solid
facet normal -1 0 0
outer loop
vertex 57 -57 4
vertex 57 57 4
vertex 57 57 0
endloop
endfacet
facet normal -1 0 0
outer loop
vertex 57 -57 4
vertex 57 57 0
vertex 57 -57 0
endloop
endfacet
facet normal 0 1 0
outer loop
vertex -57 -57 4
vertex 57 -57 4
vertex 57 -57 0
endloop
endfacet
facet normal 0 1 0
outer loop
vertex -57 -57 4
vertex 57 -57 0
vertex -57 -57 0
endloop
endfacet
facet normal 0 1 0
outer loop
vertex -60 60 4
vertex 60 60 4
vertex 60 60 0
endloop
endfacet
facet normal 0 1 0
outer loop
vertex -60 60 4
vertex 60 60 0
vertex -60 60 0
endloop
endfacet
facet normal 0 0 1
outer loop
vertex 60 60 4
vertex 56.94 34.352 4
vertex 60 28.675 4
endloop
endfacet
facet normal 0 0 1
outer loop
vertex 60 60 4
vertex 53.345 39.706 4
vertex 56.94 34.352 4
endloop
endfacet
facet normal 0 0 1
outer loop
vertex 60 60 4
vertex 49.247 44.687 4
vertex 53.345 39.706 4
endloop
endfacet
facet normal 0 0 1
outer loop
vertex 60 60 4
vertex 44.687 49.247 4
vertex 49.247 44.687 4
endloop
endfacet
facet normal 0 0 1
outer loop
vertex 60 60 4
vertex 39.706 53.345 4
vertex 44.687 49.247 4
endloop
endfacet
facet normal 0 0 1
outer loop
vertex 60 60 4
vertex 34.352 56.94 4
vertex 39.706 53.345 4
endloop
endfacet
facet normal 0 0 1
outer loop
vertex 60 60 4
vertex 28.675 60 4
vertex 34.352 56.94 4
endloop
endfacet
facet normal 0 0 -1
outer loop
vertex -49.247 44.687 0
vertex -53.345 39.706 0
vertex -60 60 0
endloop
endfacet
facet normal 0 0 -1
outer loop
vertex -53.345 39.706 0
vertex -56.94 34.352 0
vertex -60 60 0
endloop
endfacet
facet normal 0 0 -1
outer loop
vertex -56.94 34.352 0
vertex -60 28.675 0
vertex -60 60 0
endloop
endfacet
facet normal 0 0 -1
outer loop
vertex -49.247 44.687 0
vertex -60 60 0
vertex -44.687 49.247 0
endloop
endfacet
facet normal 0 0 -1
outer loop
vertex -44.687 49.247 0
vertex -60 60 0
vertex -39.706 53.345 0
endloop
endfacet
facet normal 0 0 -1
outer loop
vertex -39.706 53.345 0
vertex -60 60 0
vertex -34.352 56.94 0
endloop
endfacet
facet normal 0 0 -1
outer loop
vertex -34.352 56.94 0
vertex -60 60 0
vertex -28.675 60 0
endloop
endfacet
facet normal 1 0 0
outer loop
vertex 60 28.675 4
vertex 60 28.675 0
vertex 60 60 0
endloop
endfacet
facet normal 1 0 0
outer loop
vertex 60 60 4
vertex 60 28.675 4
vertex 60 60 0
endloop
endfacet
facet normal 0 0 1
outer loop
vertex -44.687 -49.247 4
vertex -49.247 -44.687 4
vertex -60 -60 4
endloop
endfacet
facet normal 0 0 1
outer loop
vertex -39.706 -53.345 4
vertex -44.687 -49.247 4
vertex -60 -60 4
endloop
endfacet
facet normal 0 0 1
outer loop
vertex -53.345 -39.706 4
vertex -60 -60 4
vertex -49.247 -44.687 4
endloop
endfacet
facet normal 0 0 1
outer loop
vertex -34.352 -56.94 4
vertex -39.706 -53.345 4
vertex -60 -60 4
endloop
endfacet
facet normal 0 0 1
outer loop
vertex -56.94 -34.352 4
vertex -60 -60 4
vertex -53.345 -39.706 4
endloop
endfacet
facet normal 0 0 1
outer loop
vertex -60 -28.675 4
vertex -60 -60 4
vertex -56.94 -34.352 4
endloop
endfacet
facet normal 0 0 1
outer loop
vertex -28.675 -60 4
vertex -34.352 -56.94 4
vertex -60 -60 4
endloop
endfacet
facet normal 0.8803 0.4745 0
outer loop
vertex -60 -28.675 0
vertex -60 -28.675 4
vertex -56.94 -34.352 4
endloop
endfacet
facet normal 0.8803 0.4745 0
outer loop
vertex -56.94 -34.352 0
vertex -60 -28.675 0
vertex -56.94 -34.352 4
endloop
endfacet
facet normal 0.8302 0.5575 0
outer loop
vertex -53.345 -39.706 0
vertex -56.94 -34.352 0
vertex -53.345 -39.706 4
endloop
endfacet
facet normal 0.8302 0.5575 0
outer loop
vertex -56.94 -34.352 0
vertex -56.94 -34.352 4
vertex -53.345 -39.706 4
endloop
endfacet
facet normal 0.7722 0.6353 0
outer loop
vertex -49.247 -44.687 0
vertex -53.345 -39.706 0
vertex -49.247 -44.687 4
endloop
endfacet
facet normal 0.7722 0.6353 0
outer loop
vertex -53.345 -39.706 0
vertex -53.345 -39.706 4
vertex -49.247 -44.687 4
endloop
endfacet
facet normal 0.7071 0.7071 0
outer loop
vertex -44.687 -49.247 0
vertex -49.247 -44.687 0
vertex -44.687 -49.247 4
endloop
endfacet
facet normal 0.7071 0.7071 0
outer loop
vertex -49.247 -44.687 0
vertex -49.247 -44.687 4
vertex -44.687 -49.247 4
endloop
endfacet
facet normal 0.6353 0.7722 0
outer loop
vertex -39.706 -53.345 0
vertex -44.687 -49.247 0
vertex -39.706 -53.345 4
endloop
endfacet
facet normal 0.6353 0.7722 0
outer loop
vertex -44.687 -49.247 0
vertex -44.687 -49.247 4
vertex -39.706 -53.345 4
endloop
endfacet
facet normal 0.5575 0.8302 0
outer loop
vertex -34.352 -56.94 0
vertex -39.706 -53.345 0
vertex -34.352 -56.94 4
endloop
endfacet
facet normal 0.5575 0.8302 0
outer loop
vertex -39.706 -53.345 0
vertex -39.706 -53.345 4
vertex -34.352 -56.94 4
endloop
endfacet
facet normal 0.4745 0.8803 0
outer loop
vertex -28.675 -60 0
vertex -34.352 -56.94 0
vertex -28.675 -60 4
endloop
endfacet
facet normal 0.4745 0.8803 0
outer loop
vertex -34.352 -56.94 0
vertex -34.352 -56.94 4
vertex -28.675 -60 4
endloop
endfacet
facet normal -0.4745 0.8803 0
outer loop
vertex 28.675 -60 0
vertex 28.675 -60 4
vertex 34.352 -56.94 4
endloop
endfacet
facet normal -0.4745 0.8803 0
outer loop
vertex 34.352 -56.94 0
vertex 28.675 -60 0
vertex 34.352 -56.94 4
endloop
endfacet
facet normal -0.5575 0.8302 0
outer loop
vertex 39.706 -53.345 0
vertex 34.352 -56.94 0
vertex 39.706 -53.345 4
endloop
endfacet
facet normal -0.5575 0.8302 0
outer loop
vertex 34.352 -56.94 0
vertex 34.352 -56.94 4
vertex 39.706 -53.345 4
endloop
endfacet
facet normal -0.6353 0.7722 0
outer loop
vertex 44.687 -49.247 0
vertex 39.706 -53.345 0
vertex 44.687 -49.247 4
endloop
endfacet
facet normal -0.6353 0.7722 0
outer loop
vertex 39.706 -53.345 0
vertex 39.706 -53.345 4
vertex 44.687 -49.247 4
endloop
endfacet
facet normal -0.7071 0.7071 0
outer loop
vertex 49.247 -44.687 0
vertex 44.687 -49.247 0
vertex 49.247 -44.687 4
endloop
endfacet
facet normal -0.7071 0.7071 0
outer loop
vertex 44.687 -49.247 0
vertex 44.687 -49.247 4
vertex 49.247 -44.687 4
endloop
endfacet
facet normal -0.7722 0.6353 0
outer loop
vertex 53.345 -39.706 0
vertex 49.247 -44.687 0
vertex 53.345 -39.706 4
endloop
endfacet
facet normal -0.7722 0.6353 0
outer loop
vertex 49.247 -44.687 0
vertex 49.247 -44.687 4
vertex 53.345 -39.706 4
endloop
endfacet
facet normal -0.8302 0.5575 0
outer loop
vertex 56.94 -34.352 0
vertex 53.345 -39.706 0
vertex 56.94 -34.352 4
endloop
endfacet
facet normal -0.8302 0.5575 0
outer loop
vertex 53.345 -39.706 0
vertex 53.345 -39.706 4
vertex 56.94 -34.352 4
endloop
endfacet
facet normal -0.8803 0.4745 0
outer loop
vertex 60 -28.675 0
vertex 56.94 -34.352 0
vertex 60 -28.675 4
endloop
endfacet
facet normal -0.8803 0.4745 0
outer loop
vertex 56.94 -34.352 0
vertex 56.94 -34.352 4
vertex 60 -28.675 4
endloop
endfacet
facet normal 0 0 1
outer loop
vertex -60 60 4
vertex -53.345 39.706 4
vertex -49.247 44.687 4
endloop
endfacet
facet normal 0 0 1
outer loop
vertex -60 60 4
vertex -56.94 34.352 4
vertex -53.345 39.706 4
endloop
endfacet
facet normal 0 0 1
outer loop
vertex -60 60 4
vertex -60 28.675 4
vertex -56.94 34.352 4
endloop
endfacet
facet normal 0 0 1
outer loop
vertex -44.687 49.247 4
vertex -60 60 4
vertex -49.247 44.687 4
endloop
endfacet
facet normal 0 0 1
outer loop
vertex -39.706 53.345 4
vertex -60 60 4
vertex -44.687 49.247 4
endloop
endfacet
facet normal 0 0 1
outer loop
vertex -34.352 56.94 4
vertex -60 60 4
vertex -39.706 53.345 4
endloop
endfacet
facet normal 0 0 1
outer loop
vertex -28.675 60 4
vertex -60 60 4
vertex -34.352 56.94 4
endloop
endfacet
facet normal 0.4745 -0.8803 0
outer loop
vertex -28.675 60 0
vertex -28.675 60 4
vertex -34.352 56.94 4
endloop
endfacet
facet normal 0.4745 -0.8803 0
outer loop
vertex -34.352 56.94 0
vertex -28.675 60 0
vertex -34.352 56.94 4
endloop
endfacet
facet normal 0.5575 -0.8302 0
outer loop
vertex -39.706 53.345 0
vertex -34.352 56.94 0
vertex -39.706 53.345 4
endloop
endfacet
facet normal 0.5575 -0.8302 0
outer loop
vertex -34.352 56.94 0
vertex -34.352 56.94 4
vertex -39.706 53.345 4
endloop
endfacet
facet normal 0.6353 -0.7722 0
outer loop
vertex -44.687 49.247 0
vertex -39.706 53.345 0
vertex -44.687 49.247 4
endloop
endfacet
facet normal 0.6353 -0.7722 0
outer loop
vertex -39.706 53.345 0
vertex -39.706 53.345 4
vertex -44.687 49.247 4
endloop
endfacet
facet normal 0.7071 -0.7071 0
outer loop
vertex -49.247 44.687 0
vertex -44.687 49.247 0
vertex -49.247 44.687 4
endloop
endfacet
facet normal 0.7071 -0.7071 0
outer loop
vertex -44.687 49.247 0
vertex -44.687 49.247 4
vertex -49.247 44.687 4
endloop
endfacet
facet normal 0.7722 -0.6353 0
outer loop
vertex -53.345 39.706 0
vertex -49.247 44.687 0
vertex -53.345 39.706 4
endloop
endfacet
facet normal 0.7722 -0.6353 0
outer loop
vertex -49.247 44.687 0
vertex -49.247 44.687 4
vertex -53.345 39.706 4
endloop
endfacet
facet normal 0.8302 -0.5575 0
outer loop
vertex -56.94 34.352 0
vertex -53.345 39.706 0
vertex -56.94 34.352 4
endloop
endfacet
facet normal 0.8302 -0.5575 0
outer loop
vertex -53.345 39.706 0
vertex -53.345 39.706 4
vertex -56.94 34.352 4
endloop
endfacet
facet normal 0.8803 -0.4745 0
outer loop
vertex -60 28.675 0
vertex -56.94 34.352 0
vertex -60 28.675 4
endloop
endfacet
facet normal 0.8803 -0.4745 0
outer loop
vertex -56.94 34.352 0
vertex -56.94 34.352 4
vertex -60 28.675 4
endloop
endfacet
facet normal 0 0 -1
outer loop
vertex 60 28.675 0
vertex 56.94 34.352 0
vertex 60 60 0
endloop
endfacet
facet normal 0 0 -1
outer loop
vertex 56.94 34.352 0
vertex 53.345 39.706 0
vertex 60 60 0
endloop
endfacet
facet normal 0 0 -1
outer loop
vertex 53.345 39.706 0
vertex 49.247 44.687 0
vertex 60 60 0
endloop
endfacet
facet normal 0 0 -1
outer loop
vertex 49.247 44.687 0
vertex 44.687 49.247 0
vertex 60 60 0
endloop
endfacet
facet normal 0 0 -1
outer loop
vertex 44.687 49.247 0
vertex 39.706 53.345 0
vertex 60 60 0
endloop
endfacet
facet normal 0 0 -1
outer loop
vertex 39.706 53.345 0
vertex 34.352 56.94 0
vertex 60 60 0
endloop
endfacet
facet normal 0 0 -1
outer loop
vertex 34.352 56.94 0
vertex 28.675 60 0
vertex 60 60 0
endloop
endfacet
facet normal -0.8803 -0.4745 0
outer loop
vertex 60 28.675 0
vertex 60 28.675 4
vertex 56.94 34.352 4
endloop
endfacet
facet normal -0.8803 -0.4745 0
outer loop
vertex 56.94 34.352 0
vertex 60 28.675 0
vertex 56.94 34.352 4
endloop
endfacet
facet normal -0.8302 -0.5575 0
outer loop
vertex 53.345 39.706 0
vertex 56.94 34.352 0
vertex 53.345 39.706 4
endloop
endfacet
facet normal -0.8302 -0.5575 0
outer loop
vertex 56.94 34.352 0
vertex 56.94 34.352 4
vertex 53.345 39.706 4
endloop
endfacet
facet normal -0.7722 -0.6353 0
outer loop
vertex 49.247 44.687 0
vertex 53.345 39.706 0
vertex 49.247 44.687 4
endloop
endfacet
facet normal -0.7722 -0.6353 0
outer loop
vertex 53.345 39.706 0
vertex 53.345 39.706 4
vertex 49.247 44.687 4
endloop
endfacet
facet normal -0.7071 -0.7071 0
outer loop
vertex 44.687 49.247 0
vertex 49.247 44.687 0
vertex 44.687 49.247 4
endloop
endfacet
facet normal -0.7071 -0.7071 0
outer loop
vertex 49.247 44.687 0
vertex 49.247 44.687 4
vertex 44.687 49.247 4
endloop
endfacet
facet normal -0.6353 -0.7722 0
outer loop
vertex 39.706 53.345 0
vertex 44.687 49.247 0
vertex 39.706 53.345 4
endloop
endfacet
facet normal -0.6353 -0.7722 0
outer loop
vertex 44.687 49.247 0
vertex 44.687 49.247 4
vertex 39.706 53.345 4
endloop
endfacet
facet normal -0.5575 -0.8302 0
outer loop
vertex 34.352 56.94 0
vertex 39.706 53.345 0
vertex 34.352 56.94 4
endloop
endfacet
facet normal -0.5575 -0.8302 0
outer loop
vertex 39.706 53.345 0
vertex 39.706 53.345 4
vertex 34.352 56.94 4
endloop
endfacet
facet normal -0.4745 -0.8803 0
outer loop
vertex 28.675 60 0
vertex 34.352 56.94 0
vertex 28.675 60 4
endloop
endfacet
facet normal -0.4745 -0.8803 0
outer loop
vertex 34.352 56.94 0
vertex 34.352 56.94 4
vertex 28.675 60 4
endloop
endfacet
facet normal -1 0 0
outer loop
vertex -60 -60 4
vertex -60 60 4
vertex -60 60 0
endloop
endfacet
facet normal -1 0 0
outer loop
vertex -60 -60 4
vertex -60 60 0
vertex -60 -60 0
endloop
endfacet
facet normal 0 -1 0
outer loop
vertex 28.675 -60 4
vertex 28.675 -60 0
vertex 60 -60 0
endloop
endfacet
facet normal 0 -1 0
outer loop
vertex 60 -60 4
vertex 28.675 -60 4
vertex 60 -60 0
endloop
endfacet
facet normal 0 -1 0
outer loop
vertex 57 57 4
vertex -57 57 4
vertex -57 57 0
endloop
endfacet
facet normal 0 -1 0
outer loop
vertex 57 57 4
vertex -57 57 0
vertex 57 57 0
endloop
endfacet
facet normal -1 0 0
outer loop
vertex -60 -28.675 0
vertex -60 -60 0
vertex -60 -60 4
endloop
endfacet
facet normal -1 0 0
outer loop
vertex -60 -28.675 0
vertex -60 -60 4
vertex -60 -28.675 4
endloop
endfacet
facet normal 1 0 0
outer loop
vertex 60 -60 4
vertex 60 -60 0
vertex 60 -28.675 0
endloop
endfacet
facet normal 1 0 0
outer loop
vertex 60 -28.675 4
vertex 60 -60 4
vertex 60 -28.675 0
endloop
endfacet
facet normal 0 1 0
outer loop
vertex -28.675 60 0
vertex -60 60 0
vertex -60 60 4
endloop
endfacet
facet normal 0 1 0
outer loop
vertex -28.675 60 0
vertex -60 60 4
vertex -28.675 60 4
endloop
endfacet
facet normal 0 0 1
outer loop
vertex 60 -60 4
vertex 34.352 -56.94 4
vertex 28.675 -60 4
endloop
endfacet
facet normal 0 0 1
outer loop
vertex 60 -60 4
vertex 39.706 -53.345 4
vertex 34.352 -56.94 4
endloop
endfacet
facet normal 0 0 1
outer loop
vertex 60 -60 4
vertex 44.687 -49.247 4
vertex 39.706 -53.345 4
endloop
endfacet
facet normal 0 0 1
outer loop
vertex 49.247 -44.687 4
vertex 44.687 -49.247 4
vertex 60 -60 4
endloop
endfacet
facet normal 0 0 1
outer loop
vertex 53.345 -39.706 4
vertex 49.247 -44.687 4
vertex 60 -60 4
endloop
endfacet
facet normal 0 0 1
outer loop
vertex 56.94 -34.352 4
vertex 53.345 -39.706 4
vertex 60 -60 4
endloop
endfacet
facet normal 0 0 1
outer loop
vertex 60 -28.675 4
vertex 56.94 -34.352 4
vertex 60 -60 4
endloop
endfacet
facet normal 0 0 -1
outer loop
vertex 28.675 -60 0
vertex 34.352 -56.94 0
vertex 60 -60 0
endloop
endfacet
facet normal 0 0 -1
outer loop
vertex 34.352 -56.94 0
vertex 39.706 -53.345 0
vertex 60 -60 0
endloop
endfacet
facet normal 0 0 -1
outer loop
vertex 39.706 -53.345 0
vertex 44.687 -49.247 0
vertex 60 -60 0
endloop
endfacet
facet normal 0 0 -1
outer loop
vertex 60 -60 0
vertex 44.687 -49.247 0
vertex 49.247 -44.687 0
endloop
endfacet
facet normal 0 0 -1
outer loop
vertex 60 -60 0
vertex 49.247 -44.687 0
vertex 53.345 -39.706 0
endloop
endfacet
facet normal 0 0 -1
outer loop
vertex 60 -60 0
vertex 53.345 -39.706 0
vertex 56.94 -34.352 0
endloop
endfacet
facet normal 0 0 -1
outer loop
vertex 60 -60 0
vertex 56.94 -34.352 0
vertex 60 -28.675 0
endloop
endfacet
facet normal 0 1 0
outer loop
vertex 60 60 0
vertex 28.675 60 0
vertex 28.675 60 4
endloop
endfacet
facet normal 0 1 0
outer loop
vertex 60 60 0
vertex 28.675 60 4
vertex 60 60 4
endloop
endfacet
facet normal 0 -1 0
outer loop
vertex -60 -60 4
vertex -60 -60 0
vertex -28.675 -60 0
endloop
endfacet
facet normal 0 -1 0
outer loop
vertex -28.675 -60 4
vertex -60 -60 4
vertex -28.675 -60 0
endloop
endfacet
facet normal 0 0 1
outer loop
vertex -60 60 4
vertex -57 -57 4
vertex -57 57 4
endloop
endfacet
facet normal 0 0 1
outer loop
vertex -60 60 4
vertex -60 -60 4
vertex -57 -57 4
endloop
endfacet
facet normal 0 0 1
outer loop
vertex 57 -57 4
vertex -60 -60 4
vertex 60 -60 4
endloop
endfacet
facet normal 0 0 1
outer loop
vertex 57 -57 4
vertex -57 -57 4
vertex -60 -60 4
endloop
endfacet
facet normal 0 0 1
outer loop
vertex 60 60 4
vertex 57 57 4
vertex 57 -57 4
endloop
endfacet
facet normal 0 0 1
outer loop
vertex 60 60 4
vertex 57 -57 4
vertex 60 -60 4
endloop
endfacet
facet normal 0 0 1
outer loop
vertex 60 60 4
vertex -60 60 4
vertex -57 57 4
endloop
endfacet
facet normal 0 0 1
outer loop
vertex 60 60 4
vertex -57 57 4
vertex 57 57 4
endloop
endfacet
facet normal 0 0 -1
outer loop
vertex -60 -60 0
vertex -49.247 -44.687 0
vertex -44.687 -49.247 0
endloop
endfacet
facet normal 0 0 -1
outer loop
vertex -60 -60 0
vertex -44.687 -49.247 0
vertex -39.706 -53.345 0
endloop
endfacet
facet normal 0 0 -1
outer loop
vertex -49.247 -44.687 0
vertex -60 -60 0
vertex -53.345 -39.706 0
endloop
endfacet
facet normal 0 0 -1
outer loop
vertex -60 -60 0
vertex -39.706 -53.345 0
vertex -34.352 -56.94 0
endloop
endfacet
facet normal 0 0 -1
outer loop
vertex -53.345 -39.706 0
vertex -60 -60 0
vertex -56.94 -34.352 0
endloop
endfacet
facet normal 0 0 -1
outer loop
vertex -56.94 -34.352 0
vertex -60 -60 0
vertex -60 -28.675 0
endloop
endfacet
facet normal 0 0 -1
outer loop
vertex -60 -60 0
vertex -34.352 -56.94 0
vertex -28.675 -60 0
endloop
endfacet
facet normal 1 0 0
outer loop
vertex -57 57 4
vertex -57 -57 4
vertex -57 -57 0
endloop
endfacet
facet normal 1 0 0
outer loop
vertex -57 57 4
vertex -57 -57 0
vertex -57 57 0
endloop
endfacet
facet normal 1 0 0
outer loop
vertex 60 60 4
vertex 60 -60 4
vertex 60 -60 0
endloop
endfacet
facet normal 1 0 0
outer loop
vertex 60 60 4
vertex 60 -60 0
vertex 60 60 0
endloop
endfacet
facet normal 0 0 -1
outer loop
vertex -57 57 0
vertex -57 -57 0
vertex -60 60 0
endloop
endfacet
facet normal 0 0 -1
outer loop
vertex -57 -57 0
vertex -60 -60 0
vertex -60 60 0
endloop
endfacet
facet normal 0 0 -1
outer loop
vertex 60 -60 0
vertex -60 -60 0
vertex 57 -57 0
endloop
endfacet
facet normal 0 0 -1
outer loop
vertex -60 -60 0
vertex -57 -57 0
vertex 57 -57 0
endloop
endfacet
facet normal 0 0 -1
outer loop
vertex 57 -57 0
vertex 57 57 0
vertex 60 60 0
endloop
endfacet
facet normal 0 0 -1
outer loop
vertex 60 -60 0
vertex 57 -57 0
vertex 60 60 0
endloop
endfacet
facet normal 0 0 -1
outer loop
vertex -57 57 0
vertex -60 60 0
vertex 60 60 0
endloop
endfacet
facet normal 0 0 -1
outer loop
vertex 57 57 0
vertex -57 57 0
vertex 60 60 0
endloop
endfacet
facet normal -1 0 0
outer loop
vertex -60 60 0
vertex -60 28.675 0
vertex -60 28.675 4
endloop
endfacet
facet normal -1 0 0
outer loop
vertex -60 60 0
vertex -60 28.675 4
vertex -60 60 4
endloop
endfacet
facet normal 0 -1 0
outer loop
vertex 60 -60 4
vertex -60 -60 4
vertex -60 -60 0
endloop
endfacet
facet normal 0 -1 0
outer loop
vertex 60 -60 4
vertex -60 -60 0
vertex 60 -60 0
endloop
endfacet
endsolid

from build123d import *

# Parameters (mm, degrees)
F0_W     = 120
F0_H     = 120
F1_DEPTH = 4
F3_DEPTH = 25
F5_DEPTH = 4


with BuildPart() as f1:
    # F0 (on Top) → F1 (new body)
    with BuildSketch(Plane.XY):
        Rectangle(F0_W, F0_H)
    extrude(amount=F1_DEPTH)

    # F2 (on face) → F3 (cut)
    with BuildSketch(Plane.XY.offset(4)):
        with BuildLine():
            Line((60, -28.6749019179), (60, 28.6749019179))
            ThreePointArc((60, 28.6749019179), (47.0226009489, 47.0226009489), (28.6749019179, 60))
            Line((28.6749019179, 60), (-28.6749019179, 60))
            ThreePointArc((-28.6749019179, 60), (-47.0226009489, 47.0226009489), (-60, 28.6749019179))
            Line((-60, 28.6749019179), (-60, -28.6749019179))
            ThreePointArc((-60, -28.6749019179), (-47.0226009489, -47.0226009489), (-28.6749019179, -60))
            Line((-28.6749019179, -60), (28.6749019179, -60))
            ThreePointArc((28.6749019179, -60), (47.0226009489, -47.0226009489), (60, -28.6749019179))
        make_face()
    extrude(amount=-F3_DEPTH, mode=Mode.SUBTRACT)


with BuildPart() as f5:
    # F4 (on face) → F5 (new body)
    with BuildSketch(Plane.XY.offset(4)):
        with BuildLine():
            Line((60, 60), (-28.6749019179, 60))
            ThreePointArc((-28.6749019179, 60), (-31.4995545782, 58.5664414266), (-34.2527371169, 57))
            Line((-34.2527371169, 57), (57, 57))
            Line((57, 57), (57, -57))
            Line((57, -57), (-57, -57))
            Line((-57, -57), (-57, 34.2527371169))
            ThreePointArc((-57, 34.2527371169), (-58.5664414266, 31.4995545782), (-60, 28.6749019179))
            Line((-60, 28.6749019179), (-60, -60))
            Line((-60, -60), (60, -60))
            Line((60, -60), (60, 60))
        make_face()
        with BuildLine():
            Line((-28.6749019179, 60), (-60, 60))
            Line((-60, 60), (-60, 28.6749019179))
            ThreePointArc((-60, 28.6749019179), (-58.5664414266, 31.4995545782), (-57, 34.2527371169))
            Line((-57, 34.2527371169), (-57, 57))
            Line((-57, 57), (-34.2527371169, 57))
            ThreePointArc((-34.2527371169, 57), (-31.4995545782, 58.5664414266), (-28.6749019179, 60))
        make_face()
    extrude(amount=-F5_DEPTH)


solid = Compound([f1.part, f5.part])
